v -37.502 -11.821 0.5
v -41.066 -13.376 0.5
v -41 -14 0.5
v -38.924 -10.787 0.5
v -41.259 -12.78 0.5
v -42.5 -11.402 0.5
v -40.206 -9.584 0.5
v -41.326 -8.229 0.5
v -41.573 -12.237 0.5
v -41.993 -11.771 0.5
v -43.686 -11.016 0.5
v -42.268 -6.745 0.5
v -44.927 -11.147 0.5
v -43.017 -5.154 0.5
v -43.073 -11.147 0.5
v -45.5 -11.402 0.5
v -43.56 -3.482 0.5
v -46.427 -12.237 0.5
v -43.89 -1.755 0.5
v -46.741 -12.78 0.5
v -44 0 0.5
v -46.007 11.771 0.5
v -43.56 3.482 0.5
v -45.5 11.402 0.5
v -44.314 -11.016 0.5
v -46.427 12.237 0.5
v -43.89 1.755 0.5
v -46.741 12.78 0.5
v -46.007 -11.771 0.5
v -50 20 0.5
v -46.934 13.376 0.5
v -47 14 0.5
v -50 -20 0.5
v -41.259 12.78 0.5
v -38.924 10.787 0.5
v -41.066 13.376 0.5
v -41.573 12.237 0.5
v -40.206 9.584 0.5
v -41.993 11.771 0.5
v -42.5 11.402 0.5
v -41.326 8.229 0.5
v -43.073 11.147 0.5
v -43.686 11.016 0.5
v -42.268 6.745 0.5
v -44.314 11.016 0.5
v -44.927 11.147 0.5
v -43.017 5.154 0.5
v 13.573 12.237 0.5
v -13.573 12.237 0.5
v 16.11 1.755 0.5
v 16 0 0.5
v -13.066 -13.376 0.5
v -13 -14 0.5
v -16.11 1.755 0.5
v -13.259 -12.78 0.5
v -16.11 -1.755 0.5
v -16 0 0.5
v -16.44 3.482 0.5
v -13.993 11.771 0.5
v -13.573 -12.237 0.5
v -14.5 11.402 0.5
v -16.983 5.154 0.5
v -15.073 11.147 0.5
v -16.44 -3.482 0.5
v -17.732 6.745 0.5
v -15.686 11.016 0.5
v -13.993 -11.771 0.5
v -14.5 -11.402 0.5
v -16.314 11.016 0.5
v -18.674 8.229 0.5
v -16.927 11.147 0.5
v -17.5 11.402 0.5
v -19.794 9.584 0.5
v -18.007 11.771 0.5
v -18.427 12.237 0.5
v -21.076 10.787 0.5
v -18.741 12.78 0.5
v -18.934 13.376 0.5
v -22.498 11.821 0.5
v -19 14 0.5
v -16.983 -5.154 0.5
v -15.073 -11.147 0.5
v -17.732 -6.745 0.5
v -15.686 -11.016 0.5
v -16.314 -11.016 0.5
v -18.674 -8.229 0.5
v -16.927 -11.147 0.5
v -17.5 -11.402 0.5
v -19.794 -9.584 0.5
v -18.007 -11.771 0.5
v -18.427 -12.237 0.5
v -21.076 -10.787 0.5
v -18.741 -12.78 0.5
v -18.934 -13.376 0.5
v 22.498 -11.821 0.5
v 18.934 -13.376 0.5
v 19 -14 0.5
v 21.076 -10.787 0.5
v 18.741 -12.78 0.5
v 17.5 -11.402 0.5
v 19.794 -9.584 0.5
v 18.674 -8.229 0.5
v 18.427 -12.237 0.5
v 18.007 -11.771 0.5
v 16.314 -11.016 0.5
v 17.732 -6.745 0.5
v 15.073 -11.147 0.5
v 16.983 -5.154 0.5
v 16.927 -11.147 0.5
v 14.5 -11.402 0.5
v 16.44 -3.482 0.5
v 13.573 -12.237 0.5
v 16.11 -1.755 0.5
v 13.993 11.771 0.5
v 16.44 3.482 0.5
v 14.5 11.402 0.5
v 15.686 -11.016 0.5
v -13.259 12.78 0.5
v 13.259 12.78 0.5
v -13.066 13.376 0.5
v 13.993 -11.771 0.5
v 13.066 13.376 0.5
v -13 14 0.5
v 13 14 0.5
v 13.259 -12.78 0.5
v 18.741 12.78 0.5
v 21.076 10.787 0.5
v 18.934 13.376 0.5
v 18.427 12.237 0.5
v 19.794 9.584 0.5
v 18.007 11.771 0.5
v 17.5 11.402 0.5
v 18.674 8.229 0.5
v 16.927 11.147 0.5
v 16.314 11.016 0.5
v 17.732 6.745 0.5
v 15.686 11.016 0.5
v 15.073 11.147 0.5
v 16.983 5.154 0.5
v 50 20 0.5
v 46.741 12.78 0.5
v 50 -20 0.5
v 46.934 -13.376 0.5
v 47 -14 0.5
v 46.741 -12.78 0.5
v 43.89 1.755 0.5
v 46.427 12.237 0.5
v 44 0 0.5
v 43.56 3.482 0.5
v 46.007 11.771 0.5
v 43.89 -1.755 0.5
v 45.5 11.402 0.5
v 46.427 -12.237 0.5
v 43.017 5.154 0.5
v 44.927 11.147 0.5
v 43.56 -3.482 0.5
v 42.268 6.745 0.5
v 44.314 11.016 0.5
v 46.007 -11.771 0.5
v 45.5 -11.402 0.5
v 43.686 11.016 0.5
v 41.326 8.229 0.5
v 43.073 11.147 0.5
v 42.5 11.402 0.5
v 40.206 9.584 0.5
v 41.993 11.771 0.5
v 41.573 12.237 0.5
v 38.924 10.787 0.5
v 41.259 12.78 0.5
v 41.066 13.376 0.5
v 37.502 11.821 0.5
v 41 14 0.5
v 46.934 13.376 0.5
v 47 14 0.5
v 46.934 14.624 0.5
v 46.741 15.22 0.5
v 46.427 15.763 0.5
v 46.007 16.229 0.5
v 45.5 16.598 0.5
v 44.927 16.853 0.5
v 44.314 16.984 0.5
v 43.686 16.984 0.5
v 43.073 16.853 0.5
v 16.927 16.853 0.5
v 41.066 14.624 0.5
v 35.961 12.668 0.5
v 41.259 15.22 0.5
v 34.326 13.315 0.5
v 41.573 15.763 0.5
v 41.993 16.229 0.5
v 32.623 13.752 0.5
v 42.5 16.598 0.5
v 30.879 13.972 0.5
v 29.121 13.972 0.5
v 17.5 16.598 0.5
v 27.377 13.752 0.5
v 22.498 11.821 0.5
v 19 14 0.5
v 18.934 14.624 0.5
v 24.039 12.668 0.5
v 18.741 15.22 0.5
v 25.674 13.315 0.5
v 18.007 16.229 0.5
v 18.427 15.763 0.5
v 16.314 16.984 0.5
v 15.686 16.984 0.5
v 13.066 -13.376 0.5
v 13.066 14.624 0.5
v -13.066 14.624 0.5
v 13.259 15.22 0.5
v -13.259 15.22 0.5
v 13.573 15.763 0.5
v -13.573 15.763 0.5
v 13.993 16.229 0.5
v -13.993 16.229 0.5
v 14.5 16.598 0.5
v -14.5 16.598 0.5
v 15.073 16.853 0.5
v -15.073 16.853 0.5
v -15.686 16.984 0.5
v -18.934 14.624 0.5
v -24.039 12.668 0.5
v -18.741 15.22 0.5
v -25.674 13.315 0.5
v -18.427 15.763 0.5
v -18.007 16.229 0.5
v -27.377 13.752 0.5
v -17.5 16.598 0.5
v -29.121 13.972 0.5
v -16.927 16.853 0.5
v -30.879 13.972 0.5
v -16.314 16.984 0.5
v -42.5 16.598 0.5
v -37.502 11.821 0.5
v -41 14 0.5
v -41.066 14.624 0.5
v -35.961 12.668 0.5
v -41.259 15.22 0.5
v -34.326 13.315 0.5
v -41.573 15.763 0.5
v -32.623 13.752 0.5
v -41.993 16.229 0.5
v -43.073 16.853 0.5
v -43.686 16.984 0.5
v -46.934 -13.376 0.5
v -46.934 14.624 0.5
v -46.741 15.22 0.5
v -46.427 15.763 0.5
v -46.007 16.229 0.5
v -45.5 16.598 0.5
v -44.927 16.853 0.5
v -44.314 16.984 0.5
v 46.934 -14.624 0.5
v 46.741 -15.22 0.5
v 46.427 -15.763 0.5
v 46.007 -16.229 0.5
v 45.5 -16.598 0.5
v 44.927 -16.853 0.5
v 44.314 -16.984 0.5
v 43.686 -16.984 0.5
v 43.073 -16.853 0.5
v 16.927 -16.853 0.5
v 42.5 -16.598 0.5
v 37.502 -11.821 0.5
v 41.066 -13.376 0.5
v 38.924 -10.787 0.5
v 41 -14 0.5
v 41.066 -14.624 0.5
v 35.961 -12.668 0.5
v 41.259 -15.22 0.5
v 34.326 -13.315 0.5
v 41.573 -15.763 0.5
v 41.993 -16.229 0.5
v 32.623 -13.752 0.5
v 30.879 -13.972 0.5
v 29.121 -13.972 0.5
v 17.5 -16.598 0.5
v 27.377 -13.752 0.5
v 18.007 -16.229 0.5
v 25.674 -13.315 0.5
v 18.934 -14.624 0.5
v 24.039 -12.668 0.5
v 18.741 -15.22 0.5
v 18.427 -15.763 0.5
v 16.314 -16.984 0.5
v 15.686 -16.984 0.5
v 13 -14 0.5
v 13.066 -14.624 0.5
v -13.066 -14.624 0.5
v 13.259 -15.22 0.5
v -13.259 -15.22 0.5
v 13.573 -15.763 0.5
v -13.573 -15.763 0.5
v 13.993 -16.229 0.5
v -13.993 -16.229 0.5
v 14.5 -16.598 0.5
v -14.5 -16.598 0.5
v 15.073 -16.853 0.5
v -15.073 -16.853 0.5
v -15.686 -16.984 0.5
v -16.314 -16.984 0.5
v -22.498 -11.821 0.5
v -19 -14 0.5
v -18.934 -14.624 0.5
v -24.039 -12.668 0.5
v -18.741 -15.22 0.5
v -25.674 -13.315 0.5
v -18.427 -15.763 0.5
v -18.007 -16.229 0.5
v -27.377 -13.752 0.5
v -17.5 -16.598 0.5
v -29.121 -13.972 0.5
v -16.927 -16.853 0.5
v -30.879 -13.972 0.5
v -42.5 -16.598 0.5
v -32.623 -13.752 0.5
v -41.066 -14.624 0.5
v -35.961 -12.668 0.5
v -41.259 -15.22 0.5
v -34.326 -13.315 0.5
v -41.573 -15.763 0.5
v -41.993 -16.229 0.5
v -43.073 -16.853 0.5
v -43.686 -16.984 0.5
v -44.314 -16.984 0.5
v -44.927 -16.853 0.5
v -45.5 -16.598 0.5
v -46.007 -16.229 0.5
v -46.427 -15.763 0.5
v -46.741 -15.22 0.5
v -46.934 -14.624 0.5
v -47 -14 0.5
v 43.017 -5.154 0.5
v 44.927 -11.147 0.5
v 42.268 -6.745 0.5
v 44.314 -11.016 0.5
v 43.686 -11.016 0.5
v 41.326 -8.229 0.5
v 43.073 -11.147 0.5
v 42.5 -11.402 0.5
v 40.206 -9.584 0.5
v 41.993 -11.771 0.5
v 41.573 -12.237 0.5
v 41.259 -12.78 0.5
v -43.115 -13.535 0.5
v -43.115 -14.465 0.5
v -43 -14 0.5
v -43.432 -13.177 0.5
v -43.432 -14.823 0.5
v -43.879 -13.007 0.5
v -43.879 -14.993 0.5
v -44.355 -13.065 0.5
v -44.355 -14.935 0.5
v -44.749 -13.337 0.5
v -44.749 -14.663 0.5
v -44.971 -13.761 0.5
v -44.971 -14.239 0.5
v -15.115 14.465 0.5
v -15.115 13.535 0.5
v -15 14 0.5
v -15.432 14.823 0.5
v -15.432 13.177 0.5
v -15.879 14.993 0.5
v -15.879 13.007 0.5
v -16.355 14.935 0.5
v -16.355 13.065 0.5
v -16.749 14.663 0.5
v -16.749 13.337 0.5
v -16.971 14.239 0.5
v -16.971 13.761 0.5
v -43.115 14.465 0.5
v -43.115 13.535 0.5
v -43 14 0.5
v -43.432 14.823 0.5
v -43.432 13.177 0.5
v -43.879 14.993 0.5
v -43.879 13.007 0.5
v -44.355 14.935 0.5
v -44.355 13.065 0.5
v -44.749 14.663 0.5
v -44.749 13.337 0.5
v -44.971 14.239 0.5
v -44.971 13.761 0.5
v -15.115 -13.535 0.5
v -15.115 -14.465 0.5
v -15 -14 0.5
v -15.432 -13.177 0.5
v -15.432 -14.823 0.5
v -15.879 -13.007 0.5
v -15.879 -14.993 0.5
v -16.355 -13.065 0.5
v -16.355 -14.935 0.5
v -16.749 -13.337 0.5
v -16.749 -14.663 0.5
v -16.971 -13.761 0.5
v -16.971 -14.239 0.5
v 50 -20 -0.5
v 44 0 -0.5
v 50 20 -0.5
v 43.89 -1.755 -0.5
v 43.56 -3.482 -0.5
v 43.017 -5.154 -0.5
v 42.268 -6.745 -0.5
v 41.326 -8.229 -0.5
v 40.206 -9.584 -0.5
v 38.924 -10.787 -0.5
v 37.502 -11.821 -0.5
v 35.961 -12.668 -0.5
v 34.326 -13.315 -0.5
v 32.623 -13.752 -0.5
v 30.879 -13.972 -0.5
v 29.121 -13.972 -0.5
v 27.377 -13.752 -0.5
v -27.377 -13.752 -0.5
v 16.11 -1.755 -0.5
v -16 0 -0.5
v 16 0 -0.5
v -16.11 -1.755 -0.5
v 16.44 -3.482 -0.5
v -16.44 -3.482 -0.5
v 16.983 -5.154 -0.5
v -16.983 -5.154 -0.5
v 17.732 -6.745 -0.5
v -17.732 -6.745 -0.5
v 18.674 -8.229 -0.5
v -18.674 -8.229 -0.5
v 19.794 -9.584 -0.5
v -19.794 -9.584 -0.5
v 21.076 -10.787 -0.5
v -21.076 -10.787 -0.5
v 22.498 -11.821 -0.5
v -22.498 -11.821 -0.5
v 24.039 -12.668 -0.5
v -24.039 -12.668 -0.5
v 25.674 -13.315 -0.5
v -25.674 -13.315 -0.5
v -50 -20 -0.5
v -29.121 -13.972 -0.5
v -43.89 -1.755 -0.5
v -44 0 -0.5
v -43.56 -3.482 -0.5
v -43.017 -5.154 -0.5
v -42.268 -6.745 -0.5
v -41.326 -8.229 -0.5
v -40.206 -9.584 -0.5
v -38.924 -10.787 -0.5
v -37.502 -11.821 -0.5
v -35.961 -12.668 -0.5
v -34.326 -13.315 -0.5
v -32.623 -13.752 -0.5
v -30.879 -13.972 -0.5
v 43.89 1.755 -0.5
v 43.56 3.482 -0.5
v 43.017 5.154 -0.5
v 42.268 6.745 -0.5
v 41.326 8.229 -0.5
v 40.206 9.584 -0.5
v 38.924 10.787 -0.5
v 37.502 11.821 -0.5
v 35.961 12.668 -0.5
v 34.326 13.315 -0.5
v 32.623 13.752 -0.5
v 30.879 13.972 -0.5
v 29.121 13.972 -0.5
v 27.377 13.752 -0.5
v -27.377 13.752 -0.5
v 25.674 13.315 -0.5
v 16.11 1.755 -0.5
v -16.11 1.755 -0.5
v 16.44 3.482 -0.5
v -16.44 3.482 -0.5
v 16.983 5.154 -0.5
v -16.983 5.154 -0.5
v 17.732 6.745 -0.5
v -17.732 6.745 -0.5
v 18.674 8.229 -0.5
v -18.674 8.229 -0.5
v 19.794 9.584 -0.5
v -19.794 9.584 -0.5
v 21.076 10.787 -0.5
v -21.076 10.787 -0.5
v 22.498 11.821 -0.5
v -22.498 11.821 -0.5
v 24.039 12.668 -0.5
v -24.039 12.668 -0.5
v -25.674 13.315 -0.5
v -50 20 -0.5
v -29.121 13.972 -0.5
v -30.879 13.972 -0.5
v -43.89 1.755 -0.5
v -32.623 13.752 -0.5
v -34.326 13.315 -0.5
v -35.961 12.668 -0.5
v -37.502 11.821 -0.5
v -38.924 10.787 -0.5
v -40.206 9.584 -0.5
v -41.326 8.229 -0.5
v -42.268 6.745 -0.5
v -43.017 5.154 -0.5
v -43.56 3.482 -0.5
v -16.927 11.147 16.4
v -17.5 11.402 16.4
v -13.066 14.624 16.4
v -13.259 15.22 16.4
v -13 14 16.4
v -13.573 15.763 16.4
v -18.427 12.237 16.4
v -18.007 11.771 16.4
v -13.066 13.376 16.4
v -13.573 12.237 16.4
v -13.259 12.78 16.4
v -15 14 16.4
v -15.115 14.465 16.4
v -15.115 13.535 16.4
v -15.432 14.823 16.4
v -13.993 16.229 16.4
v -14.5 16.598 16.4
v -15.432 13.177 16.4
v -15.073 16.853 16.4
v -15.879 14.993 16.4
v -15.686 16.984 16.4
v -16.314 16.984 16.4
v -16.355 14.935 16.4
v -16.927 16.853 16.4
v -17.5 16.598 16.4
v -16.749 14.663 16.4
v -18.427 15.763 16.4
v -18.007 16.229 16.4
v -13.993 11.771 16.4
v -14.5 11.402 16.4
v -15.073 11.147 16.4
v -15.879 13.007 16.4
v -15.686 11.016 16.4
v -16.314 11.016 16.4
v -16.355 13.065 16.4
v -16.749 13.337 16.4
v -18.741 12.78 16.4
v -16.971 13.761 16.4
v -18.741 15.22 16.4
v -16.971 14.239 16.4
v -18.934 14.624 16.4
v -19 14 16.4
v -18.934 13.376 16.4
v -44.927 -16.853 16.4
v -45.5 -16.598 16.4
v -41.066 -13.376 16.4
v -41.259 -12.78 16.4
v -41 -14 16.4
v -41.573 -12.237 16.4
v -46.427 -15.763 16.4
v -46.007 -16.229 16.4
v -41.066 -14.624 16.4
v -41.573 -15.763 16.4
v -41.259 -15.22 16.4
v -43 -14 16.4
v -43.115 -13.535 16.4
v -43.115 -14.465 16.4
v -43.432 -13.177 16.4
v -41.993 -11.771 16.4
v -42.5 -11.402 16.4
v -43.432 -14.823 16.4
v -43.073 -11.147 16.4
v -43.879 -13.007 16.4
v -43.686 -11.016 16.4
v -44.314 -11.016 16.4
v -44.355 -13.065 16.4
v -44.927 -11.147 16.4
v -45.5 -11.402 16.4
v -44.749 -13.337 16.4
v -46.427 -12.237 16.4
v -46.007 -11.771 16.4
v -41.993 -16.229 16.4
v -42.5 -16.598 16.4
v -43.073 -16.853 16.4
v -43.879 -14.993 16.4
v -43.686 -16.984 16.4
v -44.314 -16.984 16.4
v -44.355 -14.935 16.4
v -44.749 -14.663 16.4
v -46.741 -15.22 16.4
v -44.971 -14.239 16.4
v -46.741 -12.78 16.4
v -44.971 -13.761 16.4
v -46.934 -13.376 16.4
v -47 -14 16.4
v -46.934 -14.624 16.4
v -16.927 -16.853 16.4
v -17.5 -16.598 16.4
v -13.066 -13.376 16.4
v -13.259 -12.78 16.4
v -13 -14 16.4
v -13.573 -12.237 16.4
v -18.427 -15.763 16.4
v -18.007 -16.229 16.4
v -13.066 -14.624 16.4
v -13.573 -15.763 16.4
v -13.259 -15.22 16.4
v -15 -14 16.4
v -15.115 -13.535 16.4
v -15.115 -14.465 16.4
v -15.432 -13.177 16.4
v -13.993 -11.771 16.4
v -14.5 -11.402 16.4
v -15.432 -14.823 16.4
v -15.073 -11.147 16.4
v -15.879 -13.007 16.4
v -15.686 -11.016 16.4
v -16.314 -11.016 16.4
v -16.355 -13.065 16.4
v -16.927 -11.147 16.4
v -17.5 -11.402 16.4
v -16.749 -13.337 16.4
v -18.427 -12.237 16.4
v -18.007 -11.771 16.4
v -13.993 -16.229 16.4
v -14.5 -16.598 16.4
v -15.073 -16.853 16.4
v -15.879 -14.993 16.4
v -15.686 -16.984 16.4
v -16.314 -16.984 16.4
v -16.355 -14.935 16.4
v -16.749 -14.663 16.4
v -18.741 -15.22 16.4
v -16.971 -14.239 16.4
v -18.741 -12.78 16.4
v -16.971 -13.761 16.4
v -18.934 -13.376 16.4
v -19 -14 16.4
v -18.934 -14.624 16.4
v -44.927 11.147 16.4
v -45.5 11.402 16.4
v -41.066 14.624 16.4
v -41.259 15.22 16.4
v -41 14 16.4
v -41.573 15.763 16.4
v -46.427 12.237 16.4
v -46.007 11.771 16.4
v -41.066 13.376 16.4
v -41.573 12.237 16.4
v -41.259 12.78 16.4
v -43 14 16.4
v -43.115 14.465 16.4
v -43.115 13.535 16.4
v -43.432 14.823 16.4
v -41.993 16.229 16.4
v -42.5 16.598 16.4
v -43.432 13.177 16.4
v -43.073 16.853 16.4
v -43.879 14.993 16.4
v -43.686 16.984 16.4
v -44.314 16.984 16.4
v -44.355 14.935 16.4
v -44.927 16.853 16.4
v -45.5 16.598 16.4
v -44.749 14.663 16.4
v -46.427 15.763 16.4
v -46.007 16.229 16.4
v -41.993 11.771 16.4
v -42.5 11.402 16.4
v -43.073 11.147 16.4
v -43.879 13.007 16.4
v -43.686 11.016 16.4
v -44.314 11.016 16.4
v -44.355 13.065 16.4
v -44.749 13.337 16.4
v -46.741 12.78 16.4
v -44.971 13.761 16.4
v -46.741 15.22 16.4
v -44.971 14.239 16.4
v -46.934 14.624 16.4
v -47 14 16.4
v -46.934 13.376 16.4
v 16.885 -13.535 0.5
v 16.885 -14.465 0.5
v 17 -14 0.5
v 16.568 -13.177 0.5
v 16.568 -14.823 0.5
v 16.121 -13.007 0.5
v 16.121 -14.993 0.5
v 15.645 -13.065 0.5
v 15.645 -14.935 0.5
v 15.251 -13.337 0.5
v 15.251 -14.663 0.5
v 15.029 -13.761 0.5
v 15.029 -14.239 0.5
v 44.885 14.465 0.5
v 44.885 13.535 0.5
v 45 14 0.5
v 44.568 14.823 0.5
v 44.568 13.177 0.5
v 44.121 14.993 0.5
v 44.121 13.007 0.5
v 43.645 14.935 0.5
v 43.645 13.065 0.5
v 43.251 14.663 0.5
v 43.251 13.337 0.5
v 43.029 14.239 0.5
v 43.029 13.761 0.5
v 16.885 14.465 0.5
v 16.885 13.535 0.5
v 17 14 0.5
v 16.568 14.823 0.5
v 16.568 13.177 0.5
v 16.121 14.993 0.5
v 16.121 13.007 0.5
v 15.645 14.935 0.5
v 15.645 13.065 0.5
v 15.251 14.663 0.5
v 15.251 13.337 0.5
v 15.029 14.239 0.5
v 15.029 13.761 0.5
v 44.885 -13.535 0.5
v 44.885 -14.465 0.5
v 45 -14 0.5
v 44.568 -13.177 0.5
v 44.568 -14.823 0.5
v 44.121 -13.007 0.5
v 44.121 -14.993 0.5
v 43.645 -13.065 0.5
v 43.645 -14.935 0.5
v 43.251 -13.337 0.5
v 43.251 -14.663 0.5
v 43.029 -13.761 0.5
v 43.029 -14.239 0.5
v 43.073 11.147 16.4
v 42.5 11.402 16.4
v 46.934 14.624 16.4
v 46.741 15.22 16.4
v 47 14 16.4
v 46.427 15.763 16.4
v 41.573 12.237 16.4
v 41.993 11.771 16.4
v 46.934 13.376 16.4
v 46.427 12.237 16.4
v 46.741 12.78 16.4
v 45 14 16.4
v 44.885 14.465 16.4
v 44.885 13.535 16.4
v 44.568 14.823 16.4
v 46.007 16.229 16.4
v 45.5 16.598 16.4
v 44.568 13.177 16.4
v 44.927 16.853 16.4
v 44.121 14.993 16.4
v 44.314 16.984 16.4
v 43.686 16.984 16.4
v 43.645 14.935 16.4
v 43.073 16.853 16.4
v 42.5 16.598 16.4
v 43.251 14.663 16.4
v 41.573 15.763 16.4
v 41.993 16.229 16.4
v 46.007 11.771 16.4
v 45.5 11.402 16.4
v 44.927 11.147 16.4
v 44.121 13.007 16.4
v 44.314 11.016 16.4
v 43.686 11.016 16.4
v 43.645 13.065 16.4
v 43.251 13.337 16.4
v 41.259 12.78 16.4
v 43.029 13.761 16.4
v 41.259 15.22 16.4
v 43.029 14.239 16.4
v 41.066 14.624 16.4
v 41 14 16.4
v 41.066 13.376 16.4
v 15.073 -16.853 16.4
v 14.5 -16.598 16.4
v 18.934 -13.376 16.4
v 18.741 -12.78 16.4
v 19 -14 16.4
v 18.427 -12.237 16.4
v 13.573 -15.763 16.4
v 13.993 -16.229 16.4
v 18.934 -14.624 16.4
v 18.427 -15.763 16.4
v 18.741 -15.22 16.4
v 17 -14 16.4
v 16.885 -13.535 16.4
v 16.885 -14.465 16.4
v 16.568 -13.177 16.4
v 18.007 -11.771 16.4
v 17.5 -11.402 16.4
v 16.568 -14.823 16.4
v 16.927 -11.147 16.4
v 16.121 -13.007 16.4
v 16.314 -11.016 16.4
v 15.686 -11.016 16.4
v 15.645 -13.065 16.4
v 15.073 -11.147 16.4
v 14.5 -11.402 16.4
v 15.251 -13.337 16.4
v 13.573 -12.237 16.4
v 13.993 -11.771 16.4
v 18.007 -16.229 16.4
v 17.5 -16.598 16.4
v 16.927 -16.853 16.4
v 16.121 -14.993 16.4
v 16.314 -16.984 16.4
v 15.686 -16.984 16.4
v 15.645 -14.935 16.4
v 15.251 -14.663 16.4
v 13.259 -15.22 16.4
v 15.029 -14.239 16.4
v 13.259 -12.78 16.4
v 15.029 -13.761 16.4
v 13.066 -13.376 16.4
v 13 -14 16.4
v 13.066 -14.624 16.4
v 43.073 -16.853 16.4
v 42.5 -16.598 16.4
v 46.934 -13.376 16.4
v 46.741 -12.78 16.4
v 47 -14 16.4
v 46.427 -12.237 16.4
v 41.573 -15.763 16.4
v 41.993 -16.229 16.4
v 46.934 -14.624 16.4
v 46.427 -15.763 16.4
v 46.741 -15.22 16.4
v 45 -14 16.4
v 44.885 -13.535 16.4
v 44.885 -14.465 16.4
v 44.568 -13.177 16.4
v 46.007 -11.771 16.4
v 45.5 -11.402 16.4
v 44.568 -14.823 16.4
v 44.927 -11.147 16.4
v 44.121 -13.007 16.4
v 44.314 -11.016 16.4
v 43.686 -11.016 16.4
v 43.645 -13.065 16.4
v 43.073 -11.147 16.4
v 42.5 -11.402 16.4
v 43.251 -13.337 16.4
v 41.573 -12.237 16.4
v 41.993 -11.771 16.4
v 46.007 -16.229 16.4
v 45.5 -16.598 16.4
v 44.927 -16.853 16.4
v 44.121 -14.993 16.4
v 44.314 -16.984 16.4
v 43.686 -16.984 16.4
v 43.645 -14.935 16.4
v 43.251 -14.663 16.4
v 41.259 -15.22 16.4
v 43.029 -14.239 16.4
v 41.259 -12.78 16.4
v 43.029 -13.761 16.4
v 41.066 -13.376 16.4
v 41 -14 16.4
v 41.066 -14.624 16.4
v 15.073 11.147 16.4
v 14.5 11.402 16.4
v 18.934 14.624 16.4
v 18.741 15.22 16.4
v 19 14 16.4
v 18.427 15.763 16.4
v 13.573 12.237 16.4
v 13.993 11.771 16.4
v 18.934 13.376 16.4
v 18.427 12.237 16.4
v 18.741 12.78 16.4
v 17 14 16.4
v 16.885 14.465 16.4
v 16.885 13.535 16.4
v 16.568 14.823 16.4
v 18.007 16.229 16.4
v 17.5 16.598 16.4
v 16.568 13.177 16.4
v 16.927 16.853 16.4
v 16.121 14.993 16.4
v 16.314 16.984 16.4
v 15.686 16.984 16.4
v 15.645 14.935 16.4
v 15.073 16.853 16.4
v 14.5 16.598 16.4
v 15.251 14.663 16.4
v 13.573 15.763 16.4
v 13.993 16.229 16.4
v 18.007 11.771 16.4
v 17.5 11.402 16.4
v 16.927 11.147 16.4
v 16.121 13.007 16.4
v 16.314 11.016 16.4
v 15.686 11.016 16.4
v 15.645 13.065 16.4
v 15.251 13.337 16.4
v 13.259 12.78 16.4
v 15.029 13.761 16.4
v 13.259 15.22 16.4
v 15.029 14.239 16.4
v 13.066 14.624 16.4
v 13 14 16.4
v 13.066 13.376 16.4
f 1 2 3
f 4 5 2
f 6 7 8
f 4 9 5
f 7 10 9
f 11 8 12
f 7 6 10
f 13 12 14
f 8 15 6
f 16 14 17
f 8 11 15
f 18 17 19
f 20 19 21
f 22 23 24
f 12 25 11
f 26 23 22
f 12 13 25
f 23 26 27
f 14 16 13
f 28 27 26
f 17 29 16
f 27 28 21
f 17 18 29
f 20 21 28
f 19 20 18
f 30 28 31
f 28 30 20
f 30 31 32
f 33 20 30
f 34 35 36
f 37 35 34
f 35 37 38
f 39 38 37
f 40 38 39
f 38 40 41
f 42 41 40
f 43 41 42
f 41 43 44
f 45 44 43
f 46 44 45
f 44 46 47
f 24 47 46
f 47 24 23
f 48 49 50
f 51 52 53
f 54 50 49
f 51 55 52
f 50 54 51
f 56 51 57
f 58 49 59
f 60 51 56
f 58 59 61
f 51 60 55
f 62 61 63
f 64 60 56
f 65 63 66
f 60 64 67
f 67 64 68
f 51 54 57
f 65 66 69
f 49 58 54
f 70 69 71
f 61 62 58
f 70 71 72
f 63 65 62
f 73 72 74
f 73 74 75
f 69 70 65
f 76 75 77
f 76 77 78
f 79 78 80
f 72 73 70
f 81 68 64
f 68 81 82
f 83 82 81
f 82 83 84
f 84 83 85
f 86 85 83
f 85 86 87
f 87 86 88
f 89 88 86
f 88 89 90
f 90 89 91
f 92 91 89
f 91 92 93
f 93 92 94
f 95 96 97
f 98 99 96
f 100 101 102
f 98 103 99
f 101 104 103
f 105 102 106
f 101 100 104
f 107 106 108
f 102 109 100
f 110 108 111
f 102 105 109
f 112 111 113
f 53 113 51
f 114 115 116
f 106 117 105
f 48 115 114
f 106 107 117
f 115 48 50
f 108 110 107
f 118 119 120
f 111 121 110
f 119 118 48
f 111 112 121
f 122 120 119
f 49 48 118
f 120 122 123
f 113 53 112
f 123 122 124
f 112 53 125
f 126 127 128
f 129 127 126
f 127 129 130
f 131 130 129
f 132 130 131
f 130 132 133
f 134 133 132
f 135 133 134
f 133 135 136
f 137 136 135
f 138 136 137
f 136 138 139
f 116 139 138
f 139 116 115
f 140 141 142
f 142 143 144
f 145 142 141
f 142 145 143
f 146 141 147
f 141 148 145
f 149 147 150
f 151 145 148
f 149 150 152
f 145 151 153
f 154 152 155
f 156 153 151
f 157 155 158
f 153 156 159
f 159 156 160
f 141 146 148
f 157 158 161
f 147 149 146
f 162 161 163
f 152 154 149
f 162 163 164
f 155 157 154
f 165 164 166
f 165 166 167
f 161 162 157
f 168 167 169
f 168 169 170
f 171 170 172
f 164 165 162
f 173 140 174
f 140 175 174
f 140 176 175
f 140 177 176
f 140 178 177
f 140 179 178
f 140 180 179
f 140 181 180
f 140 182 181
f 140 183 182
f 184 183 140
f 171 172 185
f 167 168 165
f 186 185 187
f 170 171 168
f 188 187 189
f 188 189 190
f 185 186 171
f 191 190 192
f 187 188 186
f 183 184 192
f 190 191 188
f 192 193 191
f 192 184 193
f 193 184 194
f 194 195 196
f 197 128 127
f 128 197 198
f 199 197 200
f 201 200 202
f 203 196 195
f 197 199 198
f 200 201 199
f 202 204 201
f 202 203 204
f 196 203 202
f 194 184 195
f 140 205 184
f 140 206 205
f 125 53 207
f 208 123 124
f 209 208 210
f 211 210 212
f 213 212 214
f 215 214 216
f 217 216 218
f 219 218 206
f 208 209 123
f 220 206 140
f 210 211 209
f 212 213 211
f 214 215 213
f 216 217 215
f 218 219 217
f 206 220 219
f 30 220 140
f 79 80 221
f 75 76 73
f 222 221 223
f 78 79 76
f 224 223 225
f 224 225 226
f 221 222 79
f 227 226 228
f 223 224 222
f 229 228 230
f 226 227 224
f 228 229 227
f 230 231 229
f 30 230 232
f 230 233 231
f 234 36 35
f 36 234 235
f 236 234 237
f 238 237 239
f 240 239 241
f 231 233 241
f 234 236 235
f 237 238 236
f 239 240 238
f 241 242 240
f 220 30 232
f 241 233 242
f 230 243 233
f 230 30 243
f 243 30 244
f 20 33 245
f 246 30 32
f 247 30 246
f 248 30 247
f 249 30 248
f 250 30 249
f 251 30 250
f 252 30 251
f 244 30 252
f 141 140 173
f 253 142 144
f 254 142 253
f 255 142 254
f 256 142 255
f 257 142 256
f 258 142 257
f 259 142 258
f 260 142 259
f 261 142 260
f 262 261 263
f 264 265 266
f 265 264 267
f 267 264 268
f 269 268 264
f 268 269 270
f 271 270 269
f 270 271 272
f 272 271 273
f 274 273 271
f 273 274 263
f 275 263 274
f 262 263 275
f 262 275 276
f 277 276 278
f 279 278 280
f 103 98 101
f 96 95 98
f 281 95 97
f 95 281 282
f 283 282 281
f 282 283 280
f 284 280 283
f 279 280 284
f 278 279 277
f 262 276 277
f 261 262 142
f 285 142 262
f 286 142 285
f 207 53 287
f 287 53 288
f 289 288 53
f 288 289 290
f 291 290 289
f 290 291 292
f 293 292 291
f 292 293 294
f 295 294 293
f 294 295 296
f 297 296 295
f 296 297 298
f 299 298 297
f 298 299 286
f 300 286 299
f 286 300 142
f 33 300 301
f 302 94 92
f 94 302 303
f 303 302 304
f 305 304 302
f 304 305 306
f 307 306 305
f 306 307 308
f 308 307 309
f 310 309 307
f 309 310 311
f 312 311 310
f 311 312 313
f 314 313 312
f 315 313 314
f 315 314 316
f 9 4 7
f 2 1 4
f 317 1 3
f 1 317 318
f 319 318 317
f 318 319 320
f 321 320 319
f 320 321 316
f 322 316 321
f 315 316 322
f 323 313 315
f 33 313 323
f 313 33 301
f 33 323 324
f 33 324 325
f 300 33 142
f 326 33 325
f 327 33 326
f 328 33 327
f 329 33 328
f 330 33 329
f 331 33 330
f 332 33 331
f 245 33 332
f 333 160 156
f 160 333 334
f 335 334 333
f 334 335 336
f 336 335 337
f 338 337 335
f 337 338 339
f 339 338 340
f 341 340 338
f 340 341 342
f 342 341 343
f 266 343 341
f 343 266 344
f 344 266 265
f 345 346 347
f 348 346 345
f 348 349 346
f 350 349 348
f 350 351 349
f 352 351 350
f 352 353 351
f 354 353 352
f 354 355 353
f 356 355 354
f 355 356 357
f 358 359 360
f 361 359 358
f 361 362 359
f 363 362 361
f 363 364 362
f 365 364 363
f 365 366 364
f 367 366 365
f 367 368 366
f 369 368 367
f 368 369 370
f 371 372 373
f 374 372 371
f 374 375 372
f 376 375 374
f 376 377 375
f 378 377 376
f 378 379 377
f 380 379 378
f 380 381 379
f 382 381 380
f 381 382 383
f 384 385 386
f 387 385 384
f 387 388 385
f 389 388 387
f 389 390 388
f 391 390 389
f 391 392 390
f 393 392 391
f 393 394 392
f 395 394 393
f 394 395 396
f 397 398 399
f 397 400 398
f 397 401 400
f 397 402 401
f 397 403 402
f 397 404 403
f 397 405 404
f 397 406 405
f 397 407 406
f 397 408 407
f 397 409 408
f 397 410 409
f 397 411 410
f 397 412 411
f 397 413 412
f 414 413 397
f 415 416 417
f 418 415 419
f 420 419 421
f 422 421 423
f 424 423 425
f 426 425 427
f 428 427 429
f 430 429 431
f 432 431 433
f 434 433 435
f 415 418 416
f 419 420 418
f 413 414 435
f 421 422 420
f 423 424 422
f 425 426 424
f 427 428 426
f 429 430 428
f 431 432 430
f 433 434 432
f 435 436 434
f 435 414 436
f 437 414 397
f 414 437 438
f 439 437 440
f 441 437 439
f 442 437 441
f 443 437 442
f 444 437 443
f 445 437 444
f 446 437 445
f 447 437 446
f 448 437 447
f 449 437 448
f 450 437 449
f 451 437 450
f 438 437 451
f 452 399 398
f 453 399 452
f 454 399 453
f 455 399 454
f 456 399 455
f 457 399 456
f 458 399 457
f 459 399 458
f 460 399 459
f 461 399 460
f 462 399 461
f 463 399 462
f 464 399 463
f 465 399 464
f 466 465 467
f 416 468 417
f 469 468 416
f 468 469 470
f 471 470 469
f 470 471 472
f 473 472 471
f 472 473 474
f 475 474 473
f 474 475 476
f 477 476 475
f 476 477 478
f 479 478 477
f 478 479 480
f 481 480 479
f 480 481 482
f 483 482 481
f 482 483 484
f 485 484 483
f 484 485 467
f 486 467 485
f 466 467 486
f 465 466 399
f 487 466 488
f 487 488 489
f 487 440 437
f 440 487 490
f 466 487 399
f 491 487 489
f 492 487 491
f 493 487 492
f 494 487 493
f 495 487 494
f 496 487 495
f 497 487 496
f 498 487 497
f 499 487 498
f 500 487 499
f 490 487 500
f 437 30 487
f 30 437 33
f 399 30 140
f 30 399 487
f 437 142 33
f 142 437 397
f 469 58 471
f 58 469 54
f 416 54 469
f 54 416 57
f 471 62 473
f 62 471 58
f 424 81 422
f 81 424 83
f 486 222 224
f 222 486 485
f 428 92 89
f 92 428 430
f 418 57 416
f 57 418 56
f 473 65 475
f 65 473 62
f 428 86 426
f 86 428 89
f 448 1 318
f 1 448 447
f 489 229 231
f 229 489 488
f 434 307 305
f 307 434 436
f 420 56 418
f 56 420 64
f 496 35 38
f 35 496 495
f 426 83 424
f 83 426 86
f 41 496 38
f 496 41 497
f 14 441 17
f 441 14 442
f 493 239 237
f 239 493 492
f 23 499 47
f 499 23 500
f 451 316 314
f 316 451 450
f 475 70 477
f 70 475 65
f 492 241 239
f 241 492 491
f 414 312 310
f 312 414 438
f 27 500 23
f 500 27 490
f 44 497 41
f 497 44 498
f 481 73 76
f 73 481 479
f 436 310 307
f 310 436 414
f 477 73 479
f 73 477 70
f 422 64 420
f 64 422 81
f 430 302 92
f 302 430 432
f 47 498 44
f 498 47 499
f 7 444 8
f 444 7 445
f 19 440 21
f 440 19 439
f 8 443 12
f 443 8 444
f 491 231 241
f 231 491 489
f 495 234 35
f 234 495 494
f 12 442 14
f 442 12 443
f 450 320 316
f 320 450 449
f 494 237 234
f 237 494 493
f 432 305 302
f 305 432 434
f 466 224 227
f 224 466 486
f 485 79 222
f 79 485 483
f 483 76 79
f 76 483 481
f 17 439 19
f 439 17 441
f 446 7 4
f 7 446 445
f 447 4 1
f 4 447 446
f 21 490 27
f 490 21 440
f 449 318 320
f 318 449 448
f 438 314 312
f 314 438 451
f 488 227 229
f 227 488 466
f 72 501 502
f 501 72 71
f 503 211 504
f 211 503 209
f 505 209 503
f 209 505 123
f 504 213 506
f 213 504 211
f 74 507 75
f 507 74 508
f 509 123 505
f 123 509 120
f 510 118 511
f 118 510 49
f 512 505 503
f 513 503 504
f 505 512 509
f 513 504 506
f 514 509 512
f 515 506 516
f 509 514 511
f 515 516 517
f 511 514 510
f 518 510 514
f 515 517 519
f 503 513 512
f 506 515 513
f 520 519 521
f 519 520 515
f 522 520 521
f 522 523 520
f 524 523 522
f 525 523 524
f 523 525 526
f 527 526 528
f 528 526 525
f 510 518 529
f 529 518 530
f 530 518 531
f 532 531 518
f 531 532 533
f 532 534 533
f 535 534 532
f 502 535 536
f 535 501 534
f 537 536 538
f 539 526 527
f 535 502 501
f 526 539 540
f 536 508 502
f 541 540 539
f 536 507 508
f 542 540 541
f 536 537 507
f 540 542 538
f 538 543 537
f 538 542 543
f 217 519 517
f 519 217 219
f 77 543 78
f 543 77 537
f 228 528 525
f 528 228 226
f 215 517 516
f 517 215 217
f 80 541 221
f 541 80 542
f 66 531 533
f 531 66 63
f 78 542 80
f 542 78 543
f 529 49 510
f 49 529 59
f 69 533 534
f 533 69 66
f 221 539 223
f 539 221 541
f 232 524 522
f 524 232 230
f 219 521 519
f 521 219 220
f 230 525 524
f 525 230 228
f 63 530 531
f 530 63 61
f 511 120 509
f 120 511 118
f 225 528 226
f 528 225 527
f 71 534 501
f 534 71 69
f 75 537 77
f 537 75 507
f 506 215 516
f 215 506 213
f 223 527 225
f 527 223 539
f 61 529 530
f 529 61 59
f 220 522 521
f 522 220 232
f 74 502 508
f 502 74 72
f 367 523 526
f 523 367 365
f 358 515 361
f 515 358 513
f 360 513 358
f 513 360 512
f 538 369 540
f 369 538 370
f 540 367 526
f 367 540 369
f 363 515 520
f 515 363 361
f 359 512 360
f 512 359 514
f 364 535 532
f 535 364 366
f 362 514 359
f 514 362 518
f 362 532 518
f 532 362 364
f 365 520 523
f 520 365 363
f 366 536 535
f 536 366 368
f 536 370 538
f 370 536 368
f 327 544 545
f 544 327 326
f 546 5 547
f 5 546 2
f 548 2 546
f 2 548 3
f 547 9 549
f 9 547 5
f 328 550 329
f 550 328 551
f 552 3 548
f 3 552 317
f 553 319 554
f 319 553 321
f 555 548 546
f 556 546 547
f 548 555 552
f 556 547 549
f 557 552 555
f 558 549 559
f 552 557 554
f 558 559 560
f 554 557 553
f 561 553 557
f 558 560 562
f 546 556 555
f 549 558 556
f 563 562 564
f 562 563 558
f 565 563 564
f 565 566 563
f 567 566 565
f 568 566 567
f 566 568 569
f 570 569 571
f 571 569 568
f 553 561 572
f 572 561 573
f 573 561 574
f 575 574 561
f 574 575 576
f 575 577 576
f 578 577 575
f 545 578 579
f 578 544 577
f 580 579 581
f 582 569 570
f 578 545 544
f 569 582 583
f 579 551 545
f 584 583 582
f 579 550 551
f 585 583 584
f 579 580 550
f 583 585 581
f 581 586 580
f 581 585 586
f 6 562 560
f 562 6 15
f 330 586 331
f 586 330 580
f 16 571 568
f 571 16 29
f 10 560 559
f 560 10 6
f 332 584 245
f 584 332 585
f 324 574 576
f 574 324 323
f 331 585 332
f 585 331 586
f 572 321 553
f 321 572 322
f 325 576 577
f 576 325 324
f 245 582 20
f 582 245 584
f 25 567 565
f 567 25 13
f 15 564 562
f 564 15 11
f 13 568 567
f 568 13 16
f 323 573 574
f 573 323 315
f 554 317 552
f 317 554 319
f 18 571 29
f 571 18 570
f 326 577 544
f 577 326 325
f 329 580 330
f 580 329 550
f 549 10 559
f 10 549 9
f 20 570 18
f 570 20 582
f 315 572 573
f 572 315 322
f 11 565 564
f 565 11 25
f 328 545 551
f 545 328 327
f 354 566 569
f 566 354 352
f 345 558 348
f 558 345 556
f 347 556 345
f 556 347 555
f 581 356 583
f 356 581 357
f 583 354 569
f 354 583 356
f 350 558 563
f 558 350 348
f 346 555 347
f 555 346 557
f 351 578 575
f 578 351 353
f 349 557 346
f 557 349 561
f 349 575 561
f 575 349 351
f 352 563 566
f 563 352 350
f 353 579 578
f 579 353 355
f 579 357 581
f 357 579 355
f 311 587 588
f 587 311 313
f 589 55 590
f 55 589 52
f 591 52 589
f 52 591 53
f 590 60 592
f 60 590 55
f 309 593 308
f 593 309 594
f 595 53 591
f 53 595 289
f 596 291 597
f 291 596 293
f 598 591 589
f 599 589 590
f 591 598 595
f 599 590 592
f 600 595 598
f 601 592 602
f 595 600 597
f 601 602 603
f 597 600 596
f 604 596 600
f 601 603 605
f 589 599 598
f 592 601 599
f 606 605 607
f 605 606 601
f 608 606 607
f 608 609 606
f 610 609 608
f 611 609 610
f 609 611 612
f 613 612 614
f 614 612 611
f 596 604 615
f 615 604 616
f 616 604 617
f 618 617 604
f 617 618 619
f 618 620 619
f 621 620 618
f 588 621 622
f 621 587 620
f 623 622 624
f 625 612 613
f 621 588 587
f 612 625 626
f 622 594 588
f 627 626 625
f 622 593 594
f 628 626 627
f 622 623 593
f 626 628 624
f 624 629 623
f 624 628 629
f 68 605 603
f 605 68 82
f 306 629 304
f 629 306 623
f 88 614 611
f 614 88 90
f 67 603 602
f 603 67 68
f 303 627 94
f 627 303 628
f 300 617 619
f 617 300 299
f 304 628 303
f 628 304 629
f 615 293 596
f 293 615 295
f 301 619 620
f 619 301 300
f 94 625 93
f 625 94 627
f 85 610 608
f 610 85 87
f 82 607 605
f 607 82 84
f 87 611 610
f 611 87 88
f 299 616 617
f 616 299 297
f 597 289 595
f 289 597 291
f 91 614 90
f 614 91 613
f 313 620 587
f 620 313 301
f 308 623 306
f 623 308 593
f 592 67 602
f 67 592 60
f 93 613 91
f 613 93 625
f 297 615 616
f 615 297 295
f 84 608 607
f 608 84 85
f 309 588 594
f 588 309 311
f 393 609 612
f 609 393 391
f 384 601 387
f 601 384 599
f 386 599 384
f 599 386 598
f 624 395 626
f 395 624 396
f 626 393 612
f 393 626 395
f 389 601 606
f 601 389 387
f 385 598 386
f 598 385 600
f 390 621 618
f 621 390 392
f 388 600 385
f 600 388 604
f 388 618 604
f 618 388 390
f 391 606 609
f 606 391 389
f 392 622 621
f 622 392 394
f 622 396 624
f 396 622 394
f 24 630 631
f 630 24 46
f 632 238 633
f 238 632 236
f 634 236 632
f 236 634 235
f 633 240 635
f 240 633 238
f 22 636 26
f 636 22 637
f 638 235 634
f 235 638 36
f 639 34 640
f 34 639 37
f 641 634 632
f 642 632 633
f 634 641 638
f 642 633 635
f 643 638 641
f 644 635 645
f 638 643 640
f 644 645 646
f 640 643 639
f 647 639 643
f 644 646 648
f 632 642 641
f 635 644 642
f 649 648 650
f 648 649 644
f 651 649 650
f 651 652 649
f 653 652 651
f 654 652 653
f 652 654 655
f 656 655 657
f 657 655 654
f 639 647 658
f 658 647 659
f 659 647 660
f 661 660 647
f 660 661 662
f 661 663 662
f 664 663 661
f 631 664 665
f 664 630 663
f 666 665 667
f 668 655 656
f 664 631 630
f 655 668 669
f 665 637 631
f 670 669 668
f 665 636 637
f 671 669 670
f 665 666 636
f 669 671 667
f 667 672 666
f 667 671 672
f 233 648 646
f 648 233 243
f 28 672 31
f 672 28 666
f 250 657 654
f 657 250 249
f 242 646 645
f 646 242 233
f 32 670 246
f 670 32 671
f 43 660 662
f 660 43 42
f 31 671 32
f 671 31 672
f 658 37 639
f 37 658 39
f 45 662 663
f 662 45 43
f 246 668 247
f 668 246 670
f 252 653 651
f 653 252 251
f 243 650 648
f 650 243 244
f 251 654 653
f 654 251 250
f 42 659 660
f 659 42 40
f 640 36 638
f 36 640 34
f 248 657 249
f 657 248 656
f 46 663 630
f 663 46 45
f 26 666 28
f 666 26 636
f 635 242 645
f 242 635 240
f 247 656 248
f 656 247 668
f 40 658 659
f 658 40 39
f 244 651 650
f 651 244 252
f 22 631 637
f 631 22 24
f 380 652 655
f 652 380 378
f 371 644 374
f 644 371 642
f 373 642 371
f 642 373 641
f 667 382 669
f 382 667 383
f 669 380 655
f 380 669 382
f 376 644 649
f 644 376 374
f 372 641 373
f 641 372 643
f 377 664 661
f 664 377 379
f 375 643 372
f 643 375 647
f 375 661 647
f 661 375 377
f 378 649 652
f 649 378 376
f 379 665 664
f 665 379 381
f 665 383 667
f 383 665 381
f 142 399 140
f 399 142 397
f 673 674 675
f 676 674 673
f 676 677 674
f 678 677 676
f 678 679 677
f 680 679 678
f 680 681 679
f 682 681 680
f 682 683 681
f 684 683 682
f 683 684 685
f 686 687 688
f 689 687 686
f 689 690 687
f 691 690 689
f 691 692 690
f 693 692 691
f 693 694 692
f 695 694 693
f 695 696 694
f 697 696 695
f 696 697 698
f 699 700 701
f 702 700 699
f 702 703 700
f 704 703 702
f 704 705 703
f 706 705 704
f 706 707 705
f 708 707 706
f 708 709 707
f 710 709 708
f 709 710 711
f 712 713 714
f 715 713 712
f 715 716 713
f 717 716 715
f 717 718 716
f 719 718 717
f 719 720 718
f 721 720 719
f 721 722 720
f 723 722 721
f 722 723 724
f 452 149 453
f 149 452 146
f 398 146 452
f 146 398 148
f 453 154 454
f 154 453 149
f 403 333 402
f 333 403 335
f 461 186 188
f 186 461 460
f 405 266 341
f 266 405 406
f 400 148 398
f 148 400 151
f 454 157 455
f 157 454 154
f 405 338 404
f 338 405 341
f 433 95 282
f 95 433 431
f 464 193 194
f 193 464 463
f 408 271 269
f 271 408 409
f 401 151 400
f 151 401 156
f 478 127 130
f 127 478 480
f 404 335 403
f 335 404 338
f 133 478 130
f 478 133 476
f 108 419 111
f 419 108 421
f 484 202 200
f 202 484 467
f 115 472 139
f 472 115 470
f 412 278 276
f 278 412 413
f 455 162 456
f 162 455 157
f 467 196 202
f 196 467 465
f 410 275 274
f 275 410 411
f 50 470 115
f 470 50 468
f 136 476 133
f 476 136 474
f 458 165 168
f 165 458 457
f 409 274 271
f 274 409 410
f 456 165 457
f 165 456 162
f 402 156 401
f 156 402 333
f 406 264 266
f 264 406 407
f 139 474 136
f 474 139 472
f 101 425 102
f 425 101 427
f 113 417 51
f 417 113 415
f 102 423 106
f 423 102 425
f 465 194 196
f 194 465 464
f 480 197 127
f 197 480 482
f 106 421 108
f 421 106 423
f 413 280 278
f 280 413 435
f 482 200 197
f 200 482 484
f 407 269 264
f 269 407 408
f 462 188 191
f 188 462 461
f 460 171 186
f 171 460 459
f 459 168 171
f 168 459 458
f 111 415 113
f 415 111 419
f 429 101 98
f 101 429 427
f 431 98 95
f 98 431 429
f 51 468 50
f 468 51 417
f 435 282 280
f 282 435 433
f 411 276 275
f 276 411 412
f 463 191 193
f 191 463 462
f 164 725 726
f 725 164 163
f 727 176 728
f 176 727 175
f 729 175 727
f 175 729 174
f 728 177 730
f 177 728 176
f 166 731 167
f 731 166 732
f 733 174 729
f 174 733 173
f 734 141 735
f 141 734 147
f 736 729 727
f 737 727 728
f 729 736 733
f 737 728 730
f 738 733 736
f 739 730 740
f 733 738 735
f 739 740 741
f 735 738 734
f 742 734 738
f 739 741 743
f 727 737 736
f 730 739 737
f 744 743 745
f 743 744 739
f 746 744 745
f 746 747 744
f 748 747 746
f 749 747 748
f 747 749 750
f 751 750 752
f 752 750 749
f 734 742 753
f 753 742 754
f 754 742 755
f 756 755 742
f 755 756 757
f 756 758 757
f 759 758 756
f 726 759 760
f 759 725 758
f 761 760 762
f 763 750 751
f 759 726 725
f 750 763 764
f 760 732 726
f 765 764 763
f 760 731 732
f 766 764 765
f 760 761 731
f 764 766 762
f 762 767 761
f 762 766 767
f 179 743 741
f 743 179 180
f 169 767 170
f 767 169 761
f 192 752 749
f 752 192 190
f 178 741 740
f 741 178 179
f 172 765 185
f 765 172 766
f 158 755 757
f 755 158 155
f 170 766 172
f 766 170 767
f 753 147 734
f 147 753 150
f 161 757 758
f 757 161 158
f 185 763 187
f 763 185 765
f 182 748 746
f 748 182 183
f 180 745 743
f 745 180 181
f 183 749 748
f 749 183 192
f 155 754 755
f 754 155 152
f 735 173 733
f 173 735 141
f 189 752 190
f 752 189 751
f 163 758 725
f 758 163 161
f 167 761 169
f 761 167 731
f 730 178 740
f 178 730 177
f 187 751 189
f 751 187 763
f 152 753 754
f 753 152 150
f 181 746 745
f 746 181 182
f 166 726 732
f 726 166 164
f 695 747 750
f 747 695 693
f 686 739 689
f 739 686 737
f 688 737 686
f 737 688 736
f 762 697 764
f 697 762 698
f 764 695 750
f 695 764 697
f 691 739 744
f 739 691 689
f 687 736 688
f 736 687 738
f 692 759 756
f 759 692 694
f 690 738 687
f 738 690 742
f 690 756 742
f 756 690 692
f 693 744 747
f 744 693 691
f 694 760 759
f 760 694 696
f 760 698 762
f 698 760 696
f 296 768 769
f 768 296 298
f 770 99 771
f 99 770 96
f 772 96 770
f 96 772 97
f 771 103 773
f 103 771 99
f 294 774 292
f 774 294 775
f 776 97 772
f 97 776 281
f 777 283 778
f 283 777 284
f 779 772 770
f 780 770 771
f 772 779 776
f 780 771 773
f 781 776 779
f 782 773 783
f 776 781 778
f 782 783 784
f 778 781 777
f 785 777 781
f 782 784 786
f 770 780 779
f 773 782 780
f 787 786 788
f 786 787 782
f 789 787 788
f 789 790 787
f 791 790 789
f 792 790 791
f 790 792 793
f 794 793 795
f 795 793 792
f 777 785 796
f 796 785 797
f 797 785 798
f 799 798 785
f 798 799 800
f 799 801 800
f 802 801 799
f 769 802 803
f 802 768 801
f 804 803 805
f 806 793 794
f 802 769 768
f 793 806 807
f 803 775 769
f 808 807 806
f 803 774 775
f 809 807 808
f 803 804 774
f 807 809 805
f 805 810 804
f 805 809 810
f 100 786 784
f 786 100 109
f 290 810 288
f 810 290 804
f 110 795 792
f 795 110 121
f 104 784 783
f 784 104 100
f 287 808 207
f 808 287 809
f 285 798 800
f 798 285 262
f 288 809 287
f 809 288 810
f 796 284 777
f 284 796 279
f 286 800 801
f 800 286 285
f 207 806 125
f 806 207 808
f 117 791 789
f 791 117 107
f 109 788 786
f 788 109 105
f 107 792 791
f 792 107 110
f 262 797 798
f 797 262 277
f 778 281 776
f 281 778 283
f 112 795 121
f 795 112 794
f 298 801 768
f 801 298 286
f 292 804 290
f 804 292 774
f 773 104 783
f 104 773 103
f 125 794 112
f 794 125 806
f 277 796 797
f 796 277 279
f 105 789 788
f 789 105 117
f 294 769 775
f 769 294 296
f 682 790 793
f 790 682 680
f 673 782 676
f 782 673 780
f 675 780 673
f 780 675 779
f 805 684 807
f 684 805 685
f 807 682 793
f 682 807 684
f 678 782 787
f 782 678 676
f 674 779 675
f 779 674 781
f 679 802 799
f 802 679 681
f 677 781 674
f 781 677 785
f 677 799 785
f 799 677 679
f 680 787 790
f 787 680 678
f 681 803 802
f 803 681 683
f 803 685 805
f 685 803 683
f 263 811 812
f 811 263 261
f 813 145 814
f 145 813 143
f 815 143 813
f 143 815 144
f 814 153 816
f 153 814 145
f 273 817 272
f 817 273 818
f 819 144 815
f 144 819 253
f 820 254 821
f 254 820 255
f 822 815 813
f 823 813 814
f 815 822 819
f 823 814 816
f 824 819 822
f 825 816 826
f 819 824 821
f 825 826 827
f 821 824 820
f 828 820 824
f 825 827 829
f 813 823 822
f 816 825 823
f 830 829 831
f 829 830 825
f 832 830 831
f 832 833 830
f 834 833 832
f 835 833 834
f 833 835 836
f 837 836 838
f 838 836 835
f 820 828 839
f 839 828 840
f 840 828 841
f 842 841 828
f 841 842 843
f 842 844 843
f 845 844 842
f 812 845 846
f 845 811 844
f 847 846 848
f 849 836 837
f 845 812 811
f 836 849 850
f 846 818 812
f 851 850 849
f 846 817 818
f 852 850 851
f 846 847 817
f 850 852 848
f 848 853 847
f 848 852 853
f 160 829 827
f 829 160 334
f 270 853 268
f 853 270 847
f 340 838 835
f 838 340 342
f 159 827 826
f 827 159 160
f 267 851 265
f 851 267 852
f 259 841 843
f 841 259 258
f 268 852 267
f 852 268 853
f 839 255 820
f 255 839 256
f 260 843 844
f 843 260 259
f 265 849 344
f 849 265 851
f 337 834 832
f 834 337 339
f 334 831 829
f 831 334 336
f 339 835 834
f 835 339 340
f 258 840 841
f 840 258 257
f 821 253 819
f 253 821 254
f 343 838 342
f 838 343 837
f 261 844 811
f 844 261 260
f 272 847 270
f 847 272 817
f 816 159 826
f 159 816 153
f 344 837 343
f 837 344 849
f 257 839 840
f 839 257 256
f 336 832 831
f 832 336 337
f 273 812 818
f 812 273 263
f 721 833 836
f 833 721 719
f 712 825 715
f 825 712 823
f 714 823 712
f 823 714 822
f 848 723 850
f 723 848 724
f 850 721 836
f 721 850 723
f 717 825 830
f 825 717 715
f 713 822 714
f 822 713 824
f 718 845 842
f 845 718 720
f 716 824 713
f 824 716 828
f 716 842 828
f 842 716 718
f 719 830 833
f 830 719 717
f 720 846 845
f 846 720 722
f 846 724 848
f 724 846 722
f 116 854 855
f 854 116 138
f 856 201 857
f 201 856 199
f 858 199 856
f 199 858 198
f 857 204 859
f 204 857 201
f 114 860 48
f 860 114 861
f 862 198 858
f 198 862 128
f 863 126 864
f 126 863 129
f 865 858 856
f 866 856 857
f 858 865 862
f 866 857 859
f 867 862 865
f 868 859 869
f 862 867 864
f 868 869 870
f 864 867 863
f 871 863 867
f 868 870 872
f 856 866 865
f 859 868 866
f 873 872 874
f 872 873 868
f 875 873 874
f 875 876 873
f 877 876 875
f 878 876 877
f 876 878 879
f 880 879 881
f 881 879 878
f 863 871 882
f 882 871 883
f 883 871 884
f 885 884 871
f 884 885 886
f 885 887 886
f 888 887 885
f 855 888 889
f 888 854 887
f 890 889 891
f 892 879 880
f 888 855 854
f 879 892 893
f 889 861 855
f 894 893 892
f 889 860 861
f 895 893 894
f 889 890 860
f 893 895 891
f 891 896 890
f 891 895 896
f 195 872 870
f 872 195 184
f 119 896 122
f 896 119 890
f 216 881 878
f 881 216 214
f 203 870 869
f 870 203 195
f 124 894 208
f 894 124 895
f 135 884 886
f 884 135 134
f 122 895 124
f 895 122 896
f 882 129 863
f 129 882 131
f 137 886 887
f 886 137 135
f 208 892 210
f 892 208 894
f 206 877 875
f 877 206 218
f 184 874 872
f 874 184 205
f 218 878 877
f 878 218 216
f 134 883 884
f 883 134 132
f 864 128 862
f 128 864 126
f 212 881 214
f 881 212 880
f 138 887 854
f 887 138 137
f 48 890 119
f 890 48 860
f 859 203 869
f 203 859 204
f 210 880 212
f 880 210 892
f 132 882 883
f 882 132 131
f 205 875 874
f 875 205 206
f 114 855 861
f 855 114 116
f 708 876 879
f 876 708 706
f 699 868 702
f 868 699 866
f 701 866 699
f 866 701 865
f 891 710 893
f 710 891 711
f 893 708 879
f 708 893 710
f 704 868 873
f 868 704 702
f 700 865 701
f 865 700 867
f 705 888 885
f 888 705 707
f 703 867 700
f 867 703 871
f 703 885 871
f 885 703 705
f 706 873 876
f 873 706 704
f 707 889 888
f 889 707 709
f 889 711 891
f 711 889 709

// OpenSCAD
cube([20, 40, 1], center=true);

// cam 1
translate([-30, 0, 0]) {
difference() {
  $fn=50;
  minkowski() {
    cube([40, 40, 1], center=true);
    //cylinder(r=2,h=.5);
  }
  translate([0,0,-1]) {
    cylinder(r=14, h=4);
  }
}
  
translate([14, 14, .4]) {
  difference() {
    cylinder(h = 16, r = 3, $fs=.5);
    cylinder(h = 16, r = 1, $fs=.5);
  }
}

translate([-14, -14, .4]) {
  difference() {
    cylinder(h = 16, r = 3, $fs=.5);
    cylinder(h = 16, r = 1, $fs=.5);
  }
}

translate([14, -14, .4]) {
  difference() {
    cylinder(h = 16, r = 3, $fs=.5);
    cylinder(h = 16, r = 1, $fs=.5);
  }
}

translate([-14, 14, .4]) {
  difference() {
    cylinder(h = 16, r = 3, $fs=.5);
    cylinder(h = 16, r = 1, $fs=.5);
  }
}
}

// Cam 2
translate([30, 0, 0]) {
difference() {
  $fn=50;
  minkowski() {
    cube([40, 40, 1], center=true);
    //cylinder(r=2,h=.5);
  }
  translate([0,0,-1]) {
    cylinder(r=14, h=4);
  }
}

translate([14, 14, .4]) {
  difference() {
    cylinder(h = 16, r = 3, $fs=.5);
    cylinder(h = 16, r = 1, $fs=.5);
  }
}

translate([-14, -14, .4]) {
  difference() {
    cylinder(h = 16, r = 3, $fs=.5);
    cylinder(h = 16, r = 1, $fs=.5);
  }
}

translate([14, -14, .4]) {
  difference() {
    cylinder(h = 16, r = 3, $fs=.5);
    cylinder(h = 16, r = 1, $fs=.5);
  }
}

translate([-14, 14, .4]) {
  difference() {
    cylinder(h = 16, r = 3, $fs=.5);
    cylinder(h = 16, r = 1, $fs=.5);
  }
}
}
